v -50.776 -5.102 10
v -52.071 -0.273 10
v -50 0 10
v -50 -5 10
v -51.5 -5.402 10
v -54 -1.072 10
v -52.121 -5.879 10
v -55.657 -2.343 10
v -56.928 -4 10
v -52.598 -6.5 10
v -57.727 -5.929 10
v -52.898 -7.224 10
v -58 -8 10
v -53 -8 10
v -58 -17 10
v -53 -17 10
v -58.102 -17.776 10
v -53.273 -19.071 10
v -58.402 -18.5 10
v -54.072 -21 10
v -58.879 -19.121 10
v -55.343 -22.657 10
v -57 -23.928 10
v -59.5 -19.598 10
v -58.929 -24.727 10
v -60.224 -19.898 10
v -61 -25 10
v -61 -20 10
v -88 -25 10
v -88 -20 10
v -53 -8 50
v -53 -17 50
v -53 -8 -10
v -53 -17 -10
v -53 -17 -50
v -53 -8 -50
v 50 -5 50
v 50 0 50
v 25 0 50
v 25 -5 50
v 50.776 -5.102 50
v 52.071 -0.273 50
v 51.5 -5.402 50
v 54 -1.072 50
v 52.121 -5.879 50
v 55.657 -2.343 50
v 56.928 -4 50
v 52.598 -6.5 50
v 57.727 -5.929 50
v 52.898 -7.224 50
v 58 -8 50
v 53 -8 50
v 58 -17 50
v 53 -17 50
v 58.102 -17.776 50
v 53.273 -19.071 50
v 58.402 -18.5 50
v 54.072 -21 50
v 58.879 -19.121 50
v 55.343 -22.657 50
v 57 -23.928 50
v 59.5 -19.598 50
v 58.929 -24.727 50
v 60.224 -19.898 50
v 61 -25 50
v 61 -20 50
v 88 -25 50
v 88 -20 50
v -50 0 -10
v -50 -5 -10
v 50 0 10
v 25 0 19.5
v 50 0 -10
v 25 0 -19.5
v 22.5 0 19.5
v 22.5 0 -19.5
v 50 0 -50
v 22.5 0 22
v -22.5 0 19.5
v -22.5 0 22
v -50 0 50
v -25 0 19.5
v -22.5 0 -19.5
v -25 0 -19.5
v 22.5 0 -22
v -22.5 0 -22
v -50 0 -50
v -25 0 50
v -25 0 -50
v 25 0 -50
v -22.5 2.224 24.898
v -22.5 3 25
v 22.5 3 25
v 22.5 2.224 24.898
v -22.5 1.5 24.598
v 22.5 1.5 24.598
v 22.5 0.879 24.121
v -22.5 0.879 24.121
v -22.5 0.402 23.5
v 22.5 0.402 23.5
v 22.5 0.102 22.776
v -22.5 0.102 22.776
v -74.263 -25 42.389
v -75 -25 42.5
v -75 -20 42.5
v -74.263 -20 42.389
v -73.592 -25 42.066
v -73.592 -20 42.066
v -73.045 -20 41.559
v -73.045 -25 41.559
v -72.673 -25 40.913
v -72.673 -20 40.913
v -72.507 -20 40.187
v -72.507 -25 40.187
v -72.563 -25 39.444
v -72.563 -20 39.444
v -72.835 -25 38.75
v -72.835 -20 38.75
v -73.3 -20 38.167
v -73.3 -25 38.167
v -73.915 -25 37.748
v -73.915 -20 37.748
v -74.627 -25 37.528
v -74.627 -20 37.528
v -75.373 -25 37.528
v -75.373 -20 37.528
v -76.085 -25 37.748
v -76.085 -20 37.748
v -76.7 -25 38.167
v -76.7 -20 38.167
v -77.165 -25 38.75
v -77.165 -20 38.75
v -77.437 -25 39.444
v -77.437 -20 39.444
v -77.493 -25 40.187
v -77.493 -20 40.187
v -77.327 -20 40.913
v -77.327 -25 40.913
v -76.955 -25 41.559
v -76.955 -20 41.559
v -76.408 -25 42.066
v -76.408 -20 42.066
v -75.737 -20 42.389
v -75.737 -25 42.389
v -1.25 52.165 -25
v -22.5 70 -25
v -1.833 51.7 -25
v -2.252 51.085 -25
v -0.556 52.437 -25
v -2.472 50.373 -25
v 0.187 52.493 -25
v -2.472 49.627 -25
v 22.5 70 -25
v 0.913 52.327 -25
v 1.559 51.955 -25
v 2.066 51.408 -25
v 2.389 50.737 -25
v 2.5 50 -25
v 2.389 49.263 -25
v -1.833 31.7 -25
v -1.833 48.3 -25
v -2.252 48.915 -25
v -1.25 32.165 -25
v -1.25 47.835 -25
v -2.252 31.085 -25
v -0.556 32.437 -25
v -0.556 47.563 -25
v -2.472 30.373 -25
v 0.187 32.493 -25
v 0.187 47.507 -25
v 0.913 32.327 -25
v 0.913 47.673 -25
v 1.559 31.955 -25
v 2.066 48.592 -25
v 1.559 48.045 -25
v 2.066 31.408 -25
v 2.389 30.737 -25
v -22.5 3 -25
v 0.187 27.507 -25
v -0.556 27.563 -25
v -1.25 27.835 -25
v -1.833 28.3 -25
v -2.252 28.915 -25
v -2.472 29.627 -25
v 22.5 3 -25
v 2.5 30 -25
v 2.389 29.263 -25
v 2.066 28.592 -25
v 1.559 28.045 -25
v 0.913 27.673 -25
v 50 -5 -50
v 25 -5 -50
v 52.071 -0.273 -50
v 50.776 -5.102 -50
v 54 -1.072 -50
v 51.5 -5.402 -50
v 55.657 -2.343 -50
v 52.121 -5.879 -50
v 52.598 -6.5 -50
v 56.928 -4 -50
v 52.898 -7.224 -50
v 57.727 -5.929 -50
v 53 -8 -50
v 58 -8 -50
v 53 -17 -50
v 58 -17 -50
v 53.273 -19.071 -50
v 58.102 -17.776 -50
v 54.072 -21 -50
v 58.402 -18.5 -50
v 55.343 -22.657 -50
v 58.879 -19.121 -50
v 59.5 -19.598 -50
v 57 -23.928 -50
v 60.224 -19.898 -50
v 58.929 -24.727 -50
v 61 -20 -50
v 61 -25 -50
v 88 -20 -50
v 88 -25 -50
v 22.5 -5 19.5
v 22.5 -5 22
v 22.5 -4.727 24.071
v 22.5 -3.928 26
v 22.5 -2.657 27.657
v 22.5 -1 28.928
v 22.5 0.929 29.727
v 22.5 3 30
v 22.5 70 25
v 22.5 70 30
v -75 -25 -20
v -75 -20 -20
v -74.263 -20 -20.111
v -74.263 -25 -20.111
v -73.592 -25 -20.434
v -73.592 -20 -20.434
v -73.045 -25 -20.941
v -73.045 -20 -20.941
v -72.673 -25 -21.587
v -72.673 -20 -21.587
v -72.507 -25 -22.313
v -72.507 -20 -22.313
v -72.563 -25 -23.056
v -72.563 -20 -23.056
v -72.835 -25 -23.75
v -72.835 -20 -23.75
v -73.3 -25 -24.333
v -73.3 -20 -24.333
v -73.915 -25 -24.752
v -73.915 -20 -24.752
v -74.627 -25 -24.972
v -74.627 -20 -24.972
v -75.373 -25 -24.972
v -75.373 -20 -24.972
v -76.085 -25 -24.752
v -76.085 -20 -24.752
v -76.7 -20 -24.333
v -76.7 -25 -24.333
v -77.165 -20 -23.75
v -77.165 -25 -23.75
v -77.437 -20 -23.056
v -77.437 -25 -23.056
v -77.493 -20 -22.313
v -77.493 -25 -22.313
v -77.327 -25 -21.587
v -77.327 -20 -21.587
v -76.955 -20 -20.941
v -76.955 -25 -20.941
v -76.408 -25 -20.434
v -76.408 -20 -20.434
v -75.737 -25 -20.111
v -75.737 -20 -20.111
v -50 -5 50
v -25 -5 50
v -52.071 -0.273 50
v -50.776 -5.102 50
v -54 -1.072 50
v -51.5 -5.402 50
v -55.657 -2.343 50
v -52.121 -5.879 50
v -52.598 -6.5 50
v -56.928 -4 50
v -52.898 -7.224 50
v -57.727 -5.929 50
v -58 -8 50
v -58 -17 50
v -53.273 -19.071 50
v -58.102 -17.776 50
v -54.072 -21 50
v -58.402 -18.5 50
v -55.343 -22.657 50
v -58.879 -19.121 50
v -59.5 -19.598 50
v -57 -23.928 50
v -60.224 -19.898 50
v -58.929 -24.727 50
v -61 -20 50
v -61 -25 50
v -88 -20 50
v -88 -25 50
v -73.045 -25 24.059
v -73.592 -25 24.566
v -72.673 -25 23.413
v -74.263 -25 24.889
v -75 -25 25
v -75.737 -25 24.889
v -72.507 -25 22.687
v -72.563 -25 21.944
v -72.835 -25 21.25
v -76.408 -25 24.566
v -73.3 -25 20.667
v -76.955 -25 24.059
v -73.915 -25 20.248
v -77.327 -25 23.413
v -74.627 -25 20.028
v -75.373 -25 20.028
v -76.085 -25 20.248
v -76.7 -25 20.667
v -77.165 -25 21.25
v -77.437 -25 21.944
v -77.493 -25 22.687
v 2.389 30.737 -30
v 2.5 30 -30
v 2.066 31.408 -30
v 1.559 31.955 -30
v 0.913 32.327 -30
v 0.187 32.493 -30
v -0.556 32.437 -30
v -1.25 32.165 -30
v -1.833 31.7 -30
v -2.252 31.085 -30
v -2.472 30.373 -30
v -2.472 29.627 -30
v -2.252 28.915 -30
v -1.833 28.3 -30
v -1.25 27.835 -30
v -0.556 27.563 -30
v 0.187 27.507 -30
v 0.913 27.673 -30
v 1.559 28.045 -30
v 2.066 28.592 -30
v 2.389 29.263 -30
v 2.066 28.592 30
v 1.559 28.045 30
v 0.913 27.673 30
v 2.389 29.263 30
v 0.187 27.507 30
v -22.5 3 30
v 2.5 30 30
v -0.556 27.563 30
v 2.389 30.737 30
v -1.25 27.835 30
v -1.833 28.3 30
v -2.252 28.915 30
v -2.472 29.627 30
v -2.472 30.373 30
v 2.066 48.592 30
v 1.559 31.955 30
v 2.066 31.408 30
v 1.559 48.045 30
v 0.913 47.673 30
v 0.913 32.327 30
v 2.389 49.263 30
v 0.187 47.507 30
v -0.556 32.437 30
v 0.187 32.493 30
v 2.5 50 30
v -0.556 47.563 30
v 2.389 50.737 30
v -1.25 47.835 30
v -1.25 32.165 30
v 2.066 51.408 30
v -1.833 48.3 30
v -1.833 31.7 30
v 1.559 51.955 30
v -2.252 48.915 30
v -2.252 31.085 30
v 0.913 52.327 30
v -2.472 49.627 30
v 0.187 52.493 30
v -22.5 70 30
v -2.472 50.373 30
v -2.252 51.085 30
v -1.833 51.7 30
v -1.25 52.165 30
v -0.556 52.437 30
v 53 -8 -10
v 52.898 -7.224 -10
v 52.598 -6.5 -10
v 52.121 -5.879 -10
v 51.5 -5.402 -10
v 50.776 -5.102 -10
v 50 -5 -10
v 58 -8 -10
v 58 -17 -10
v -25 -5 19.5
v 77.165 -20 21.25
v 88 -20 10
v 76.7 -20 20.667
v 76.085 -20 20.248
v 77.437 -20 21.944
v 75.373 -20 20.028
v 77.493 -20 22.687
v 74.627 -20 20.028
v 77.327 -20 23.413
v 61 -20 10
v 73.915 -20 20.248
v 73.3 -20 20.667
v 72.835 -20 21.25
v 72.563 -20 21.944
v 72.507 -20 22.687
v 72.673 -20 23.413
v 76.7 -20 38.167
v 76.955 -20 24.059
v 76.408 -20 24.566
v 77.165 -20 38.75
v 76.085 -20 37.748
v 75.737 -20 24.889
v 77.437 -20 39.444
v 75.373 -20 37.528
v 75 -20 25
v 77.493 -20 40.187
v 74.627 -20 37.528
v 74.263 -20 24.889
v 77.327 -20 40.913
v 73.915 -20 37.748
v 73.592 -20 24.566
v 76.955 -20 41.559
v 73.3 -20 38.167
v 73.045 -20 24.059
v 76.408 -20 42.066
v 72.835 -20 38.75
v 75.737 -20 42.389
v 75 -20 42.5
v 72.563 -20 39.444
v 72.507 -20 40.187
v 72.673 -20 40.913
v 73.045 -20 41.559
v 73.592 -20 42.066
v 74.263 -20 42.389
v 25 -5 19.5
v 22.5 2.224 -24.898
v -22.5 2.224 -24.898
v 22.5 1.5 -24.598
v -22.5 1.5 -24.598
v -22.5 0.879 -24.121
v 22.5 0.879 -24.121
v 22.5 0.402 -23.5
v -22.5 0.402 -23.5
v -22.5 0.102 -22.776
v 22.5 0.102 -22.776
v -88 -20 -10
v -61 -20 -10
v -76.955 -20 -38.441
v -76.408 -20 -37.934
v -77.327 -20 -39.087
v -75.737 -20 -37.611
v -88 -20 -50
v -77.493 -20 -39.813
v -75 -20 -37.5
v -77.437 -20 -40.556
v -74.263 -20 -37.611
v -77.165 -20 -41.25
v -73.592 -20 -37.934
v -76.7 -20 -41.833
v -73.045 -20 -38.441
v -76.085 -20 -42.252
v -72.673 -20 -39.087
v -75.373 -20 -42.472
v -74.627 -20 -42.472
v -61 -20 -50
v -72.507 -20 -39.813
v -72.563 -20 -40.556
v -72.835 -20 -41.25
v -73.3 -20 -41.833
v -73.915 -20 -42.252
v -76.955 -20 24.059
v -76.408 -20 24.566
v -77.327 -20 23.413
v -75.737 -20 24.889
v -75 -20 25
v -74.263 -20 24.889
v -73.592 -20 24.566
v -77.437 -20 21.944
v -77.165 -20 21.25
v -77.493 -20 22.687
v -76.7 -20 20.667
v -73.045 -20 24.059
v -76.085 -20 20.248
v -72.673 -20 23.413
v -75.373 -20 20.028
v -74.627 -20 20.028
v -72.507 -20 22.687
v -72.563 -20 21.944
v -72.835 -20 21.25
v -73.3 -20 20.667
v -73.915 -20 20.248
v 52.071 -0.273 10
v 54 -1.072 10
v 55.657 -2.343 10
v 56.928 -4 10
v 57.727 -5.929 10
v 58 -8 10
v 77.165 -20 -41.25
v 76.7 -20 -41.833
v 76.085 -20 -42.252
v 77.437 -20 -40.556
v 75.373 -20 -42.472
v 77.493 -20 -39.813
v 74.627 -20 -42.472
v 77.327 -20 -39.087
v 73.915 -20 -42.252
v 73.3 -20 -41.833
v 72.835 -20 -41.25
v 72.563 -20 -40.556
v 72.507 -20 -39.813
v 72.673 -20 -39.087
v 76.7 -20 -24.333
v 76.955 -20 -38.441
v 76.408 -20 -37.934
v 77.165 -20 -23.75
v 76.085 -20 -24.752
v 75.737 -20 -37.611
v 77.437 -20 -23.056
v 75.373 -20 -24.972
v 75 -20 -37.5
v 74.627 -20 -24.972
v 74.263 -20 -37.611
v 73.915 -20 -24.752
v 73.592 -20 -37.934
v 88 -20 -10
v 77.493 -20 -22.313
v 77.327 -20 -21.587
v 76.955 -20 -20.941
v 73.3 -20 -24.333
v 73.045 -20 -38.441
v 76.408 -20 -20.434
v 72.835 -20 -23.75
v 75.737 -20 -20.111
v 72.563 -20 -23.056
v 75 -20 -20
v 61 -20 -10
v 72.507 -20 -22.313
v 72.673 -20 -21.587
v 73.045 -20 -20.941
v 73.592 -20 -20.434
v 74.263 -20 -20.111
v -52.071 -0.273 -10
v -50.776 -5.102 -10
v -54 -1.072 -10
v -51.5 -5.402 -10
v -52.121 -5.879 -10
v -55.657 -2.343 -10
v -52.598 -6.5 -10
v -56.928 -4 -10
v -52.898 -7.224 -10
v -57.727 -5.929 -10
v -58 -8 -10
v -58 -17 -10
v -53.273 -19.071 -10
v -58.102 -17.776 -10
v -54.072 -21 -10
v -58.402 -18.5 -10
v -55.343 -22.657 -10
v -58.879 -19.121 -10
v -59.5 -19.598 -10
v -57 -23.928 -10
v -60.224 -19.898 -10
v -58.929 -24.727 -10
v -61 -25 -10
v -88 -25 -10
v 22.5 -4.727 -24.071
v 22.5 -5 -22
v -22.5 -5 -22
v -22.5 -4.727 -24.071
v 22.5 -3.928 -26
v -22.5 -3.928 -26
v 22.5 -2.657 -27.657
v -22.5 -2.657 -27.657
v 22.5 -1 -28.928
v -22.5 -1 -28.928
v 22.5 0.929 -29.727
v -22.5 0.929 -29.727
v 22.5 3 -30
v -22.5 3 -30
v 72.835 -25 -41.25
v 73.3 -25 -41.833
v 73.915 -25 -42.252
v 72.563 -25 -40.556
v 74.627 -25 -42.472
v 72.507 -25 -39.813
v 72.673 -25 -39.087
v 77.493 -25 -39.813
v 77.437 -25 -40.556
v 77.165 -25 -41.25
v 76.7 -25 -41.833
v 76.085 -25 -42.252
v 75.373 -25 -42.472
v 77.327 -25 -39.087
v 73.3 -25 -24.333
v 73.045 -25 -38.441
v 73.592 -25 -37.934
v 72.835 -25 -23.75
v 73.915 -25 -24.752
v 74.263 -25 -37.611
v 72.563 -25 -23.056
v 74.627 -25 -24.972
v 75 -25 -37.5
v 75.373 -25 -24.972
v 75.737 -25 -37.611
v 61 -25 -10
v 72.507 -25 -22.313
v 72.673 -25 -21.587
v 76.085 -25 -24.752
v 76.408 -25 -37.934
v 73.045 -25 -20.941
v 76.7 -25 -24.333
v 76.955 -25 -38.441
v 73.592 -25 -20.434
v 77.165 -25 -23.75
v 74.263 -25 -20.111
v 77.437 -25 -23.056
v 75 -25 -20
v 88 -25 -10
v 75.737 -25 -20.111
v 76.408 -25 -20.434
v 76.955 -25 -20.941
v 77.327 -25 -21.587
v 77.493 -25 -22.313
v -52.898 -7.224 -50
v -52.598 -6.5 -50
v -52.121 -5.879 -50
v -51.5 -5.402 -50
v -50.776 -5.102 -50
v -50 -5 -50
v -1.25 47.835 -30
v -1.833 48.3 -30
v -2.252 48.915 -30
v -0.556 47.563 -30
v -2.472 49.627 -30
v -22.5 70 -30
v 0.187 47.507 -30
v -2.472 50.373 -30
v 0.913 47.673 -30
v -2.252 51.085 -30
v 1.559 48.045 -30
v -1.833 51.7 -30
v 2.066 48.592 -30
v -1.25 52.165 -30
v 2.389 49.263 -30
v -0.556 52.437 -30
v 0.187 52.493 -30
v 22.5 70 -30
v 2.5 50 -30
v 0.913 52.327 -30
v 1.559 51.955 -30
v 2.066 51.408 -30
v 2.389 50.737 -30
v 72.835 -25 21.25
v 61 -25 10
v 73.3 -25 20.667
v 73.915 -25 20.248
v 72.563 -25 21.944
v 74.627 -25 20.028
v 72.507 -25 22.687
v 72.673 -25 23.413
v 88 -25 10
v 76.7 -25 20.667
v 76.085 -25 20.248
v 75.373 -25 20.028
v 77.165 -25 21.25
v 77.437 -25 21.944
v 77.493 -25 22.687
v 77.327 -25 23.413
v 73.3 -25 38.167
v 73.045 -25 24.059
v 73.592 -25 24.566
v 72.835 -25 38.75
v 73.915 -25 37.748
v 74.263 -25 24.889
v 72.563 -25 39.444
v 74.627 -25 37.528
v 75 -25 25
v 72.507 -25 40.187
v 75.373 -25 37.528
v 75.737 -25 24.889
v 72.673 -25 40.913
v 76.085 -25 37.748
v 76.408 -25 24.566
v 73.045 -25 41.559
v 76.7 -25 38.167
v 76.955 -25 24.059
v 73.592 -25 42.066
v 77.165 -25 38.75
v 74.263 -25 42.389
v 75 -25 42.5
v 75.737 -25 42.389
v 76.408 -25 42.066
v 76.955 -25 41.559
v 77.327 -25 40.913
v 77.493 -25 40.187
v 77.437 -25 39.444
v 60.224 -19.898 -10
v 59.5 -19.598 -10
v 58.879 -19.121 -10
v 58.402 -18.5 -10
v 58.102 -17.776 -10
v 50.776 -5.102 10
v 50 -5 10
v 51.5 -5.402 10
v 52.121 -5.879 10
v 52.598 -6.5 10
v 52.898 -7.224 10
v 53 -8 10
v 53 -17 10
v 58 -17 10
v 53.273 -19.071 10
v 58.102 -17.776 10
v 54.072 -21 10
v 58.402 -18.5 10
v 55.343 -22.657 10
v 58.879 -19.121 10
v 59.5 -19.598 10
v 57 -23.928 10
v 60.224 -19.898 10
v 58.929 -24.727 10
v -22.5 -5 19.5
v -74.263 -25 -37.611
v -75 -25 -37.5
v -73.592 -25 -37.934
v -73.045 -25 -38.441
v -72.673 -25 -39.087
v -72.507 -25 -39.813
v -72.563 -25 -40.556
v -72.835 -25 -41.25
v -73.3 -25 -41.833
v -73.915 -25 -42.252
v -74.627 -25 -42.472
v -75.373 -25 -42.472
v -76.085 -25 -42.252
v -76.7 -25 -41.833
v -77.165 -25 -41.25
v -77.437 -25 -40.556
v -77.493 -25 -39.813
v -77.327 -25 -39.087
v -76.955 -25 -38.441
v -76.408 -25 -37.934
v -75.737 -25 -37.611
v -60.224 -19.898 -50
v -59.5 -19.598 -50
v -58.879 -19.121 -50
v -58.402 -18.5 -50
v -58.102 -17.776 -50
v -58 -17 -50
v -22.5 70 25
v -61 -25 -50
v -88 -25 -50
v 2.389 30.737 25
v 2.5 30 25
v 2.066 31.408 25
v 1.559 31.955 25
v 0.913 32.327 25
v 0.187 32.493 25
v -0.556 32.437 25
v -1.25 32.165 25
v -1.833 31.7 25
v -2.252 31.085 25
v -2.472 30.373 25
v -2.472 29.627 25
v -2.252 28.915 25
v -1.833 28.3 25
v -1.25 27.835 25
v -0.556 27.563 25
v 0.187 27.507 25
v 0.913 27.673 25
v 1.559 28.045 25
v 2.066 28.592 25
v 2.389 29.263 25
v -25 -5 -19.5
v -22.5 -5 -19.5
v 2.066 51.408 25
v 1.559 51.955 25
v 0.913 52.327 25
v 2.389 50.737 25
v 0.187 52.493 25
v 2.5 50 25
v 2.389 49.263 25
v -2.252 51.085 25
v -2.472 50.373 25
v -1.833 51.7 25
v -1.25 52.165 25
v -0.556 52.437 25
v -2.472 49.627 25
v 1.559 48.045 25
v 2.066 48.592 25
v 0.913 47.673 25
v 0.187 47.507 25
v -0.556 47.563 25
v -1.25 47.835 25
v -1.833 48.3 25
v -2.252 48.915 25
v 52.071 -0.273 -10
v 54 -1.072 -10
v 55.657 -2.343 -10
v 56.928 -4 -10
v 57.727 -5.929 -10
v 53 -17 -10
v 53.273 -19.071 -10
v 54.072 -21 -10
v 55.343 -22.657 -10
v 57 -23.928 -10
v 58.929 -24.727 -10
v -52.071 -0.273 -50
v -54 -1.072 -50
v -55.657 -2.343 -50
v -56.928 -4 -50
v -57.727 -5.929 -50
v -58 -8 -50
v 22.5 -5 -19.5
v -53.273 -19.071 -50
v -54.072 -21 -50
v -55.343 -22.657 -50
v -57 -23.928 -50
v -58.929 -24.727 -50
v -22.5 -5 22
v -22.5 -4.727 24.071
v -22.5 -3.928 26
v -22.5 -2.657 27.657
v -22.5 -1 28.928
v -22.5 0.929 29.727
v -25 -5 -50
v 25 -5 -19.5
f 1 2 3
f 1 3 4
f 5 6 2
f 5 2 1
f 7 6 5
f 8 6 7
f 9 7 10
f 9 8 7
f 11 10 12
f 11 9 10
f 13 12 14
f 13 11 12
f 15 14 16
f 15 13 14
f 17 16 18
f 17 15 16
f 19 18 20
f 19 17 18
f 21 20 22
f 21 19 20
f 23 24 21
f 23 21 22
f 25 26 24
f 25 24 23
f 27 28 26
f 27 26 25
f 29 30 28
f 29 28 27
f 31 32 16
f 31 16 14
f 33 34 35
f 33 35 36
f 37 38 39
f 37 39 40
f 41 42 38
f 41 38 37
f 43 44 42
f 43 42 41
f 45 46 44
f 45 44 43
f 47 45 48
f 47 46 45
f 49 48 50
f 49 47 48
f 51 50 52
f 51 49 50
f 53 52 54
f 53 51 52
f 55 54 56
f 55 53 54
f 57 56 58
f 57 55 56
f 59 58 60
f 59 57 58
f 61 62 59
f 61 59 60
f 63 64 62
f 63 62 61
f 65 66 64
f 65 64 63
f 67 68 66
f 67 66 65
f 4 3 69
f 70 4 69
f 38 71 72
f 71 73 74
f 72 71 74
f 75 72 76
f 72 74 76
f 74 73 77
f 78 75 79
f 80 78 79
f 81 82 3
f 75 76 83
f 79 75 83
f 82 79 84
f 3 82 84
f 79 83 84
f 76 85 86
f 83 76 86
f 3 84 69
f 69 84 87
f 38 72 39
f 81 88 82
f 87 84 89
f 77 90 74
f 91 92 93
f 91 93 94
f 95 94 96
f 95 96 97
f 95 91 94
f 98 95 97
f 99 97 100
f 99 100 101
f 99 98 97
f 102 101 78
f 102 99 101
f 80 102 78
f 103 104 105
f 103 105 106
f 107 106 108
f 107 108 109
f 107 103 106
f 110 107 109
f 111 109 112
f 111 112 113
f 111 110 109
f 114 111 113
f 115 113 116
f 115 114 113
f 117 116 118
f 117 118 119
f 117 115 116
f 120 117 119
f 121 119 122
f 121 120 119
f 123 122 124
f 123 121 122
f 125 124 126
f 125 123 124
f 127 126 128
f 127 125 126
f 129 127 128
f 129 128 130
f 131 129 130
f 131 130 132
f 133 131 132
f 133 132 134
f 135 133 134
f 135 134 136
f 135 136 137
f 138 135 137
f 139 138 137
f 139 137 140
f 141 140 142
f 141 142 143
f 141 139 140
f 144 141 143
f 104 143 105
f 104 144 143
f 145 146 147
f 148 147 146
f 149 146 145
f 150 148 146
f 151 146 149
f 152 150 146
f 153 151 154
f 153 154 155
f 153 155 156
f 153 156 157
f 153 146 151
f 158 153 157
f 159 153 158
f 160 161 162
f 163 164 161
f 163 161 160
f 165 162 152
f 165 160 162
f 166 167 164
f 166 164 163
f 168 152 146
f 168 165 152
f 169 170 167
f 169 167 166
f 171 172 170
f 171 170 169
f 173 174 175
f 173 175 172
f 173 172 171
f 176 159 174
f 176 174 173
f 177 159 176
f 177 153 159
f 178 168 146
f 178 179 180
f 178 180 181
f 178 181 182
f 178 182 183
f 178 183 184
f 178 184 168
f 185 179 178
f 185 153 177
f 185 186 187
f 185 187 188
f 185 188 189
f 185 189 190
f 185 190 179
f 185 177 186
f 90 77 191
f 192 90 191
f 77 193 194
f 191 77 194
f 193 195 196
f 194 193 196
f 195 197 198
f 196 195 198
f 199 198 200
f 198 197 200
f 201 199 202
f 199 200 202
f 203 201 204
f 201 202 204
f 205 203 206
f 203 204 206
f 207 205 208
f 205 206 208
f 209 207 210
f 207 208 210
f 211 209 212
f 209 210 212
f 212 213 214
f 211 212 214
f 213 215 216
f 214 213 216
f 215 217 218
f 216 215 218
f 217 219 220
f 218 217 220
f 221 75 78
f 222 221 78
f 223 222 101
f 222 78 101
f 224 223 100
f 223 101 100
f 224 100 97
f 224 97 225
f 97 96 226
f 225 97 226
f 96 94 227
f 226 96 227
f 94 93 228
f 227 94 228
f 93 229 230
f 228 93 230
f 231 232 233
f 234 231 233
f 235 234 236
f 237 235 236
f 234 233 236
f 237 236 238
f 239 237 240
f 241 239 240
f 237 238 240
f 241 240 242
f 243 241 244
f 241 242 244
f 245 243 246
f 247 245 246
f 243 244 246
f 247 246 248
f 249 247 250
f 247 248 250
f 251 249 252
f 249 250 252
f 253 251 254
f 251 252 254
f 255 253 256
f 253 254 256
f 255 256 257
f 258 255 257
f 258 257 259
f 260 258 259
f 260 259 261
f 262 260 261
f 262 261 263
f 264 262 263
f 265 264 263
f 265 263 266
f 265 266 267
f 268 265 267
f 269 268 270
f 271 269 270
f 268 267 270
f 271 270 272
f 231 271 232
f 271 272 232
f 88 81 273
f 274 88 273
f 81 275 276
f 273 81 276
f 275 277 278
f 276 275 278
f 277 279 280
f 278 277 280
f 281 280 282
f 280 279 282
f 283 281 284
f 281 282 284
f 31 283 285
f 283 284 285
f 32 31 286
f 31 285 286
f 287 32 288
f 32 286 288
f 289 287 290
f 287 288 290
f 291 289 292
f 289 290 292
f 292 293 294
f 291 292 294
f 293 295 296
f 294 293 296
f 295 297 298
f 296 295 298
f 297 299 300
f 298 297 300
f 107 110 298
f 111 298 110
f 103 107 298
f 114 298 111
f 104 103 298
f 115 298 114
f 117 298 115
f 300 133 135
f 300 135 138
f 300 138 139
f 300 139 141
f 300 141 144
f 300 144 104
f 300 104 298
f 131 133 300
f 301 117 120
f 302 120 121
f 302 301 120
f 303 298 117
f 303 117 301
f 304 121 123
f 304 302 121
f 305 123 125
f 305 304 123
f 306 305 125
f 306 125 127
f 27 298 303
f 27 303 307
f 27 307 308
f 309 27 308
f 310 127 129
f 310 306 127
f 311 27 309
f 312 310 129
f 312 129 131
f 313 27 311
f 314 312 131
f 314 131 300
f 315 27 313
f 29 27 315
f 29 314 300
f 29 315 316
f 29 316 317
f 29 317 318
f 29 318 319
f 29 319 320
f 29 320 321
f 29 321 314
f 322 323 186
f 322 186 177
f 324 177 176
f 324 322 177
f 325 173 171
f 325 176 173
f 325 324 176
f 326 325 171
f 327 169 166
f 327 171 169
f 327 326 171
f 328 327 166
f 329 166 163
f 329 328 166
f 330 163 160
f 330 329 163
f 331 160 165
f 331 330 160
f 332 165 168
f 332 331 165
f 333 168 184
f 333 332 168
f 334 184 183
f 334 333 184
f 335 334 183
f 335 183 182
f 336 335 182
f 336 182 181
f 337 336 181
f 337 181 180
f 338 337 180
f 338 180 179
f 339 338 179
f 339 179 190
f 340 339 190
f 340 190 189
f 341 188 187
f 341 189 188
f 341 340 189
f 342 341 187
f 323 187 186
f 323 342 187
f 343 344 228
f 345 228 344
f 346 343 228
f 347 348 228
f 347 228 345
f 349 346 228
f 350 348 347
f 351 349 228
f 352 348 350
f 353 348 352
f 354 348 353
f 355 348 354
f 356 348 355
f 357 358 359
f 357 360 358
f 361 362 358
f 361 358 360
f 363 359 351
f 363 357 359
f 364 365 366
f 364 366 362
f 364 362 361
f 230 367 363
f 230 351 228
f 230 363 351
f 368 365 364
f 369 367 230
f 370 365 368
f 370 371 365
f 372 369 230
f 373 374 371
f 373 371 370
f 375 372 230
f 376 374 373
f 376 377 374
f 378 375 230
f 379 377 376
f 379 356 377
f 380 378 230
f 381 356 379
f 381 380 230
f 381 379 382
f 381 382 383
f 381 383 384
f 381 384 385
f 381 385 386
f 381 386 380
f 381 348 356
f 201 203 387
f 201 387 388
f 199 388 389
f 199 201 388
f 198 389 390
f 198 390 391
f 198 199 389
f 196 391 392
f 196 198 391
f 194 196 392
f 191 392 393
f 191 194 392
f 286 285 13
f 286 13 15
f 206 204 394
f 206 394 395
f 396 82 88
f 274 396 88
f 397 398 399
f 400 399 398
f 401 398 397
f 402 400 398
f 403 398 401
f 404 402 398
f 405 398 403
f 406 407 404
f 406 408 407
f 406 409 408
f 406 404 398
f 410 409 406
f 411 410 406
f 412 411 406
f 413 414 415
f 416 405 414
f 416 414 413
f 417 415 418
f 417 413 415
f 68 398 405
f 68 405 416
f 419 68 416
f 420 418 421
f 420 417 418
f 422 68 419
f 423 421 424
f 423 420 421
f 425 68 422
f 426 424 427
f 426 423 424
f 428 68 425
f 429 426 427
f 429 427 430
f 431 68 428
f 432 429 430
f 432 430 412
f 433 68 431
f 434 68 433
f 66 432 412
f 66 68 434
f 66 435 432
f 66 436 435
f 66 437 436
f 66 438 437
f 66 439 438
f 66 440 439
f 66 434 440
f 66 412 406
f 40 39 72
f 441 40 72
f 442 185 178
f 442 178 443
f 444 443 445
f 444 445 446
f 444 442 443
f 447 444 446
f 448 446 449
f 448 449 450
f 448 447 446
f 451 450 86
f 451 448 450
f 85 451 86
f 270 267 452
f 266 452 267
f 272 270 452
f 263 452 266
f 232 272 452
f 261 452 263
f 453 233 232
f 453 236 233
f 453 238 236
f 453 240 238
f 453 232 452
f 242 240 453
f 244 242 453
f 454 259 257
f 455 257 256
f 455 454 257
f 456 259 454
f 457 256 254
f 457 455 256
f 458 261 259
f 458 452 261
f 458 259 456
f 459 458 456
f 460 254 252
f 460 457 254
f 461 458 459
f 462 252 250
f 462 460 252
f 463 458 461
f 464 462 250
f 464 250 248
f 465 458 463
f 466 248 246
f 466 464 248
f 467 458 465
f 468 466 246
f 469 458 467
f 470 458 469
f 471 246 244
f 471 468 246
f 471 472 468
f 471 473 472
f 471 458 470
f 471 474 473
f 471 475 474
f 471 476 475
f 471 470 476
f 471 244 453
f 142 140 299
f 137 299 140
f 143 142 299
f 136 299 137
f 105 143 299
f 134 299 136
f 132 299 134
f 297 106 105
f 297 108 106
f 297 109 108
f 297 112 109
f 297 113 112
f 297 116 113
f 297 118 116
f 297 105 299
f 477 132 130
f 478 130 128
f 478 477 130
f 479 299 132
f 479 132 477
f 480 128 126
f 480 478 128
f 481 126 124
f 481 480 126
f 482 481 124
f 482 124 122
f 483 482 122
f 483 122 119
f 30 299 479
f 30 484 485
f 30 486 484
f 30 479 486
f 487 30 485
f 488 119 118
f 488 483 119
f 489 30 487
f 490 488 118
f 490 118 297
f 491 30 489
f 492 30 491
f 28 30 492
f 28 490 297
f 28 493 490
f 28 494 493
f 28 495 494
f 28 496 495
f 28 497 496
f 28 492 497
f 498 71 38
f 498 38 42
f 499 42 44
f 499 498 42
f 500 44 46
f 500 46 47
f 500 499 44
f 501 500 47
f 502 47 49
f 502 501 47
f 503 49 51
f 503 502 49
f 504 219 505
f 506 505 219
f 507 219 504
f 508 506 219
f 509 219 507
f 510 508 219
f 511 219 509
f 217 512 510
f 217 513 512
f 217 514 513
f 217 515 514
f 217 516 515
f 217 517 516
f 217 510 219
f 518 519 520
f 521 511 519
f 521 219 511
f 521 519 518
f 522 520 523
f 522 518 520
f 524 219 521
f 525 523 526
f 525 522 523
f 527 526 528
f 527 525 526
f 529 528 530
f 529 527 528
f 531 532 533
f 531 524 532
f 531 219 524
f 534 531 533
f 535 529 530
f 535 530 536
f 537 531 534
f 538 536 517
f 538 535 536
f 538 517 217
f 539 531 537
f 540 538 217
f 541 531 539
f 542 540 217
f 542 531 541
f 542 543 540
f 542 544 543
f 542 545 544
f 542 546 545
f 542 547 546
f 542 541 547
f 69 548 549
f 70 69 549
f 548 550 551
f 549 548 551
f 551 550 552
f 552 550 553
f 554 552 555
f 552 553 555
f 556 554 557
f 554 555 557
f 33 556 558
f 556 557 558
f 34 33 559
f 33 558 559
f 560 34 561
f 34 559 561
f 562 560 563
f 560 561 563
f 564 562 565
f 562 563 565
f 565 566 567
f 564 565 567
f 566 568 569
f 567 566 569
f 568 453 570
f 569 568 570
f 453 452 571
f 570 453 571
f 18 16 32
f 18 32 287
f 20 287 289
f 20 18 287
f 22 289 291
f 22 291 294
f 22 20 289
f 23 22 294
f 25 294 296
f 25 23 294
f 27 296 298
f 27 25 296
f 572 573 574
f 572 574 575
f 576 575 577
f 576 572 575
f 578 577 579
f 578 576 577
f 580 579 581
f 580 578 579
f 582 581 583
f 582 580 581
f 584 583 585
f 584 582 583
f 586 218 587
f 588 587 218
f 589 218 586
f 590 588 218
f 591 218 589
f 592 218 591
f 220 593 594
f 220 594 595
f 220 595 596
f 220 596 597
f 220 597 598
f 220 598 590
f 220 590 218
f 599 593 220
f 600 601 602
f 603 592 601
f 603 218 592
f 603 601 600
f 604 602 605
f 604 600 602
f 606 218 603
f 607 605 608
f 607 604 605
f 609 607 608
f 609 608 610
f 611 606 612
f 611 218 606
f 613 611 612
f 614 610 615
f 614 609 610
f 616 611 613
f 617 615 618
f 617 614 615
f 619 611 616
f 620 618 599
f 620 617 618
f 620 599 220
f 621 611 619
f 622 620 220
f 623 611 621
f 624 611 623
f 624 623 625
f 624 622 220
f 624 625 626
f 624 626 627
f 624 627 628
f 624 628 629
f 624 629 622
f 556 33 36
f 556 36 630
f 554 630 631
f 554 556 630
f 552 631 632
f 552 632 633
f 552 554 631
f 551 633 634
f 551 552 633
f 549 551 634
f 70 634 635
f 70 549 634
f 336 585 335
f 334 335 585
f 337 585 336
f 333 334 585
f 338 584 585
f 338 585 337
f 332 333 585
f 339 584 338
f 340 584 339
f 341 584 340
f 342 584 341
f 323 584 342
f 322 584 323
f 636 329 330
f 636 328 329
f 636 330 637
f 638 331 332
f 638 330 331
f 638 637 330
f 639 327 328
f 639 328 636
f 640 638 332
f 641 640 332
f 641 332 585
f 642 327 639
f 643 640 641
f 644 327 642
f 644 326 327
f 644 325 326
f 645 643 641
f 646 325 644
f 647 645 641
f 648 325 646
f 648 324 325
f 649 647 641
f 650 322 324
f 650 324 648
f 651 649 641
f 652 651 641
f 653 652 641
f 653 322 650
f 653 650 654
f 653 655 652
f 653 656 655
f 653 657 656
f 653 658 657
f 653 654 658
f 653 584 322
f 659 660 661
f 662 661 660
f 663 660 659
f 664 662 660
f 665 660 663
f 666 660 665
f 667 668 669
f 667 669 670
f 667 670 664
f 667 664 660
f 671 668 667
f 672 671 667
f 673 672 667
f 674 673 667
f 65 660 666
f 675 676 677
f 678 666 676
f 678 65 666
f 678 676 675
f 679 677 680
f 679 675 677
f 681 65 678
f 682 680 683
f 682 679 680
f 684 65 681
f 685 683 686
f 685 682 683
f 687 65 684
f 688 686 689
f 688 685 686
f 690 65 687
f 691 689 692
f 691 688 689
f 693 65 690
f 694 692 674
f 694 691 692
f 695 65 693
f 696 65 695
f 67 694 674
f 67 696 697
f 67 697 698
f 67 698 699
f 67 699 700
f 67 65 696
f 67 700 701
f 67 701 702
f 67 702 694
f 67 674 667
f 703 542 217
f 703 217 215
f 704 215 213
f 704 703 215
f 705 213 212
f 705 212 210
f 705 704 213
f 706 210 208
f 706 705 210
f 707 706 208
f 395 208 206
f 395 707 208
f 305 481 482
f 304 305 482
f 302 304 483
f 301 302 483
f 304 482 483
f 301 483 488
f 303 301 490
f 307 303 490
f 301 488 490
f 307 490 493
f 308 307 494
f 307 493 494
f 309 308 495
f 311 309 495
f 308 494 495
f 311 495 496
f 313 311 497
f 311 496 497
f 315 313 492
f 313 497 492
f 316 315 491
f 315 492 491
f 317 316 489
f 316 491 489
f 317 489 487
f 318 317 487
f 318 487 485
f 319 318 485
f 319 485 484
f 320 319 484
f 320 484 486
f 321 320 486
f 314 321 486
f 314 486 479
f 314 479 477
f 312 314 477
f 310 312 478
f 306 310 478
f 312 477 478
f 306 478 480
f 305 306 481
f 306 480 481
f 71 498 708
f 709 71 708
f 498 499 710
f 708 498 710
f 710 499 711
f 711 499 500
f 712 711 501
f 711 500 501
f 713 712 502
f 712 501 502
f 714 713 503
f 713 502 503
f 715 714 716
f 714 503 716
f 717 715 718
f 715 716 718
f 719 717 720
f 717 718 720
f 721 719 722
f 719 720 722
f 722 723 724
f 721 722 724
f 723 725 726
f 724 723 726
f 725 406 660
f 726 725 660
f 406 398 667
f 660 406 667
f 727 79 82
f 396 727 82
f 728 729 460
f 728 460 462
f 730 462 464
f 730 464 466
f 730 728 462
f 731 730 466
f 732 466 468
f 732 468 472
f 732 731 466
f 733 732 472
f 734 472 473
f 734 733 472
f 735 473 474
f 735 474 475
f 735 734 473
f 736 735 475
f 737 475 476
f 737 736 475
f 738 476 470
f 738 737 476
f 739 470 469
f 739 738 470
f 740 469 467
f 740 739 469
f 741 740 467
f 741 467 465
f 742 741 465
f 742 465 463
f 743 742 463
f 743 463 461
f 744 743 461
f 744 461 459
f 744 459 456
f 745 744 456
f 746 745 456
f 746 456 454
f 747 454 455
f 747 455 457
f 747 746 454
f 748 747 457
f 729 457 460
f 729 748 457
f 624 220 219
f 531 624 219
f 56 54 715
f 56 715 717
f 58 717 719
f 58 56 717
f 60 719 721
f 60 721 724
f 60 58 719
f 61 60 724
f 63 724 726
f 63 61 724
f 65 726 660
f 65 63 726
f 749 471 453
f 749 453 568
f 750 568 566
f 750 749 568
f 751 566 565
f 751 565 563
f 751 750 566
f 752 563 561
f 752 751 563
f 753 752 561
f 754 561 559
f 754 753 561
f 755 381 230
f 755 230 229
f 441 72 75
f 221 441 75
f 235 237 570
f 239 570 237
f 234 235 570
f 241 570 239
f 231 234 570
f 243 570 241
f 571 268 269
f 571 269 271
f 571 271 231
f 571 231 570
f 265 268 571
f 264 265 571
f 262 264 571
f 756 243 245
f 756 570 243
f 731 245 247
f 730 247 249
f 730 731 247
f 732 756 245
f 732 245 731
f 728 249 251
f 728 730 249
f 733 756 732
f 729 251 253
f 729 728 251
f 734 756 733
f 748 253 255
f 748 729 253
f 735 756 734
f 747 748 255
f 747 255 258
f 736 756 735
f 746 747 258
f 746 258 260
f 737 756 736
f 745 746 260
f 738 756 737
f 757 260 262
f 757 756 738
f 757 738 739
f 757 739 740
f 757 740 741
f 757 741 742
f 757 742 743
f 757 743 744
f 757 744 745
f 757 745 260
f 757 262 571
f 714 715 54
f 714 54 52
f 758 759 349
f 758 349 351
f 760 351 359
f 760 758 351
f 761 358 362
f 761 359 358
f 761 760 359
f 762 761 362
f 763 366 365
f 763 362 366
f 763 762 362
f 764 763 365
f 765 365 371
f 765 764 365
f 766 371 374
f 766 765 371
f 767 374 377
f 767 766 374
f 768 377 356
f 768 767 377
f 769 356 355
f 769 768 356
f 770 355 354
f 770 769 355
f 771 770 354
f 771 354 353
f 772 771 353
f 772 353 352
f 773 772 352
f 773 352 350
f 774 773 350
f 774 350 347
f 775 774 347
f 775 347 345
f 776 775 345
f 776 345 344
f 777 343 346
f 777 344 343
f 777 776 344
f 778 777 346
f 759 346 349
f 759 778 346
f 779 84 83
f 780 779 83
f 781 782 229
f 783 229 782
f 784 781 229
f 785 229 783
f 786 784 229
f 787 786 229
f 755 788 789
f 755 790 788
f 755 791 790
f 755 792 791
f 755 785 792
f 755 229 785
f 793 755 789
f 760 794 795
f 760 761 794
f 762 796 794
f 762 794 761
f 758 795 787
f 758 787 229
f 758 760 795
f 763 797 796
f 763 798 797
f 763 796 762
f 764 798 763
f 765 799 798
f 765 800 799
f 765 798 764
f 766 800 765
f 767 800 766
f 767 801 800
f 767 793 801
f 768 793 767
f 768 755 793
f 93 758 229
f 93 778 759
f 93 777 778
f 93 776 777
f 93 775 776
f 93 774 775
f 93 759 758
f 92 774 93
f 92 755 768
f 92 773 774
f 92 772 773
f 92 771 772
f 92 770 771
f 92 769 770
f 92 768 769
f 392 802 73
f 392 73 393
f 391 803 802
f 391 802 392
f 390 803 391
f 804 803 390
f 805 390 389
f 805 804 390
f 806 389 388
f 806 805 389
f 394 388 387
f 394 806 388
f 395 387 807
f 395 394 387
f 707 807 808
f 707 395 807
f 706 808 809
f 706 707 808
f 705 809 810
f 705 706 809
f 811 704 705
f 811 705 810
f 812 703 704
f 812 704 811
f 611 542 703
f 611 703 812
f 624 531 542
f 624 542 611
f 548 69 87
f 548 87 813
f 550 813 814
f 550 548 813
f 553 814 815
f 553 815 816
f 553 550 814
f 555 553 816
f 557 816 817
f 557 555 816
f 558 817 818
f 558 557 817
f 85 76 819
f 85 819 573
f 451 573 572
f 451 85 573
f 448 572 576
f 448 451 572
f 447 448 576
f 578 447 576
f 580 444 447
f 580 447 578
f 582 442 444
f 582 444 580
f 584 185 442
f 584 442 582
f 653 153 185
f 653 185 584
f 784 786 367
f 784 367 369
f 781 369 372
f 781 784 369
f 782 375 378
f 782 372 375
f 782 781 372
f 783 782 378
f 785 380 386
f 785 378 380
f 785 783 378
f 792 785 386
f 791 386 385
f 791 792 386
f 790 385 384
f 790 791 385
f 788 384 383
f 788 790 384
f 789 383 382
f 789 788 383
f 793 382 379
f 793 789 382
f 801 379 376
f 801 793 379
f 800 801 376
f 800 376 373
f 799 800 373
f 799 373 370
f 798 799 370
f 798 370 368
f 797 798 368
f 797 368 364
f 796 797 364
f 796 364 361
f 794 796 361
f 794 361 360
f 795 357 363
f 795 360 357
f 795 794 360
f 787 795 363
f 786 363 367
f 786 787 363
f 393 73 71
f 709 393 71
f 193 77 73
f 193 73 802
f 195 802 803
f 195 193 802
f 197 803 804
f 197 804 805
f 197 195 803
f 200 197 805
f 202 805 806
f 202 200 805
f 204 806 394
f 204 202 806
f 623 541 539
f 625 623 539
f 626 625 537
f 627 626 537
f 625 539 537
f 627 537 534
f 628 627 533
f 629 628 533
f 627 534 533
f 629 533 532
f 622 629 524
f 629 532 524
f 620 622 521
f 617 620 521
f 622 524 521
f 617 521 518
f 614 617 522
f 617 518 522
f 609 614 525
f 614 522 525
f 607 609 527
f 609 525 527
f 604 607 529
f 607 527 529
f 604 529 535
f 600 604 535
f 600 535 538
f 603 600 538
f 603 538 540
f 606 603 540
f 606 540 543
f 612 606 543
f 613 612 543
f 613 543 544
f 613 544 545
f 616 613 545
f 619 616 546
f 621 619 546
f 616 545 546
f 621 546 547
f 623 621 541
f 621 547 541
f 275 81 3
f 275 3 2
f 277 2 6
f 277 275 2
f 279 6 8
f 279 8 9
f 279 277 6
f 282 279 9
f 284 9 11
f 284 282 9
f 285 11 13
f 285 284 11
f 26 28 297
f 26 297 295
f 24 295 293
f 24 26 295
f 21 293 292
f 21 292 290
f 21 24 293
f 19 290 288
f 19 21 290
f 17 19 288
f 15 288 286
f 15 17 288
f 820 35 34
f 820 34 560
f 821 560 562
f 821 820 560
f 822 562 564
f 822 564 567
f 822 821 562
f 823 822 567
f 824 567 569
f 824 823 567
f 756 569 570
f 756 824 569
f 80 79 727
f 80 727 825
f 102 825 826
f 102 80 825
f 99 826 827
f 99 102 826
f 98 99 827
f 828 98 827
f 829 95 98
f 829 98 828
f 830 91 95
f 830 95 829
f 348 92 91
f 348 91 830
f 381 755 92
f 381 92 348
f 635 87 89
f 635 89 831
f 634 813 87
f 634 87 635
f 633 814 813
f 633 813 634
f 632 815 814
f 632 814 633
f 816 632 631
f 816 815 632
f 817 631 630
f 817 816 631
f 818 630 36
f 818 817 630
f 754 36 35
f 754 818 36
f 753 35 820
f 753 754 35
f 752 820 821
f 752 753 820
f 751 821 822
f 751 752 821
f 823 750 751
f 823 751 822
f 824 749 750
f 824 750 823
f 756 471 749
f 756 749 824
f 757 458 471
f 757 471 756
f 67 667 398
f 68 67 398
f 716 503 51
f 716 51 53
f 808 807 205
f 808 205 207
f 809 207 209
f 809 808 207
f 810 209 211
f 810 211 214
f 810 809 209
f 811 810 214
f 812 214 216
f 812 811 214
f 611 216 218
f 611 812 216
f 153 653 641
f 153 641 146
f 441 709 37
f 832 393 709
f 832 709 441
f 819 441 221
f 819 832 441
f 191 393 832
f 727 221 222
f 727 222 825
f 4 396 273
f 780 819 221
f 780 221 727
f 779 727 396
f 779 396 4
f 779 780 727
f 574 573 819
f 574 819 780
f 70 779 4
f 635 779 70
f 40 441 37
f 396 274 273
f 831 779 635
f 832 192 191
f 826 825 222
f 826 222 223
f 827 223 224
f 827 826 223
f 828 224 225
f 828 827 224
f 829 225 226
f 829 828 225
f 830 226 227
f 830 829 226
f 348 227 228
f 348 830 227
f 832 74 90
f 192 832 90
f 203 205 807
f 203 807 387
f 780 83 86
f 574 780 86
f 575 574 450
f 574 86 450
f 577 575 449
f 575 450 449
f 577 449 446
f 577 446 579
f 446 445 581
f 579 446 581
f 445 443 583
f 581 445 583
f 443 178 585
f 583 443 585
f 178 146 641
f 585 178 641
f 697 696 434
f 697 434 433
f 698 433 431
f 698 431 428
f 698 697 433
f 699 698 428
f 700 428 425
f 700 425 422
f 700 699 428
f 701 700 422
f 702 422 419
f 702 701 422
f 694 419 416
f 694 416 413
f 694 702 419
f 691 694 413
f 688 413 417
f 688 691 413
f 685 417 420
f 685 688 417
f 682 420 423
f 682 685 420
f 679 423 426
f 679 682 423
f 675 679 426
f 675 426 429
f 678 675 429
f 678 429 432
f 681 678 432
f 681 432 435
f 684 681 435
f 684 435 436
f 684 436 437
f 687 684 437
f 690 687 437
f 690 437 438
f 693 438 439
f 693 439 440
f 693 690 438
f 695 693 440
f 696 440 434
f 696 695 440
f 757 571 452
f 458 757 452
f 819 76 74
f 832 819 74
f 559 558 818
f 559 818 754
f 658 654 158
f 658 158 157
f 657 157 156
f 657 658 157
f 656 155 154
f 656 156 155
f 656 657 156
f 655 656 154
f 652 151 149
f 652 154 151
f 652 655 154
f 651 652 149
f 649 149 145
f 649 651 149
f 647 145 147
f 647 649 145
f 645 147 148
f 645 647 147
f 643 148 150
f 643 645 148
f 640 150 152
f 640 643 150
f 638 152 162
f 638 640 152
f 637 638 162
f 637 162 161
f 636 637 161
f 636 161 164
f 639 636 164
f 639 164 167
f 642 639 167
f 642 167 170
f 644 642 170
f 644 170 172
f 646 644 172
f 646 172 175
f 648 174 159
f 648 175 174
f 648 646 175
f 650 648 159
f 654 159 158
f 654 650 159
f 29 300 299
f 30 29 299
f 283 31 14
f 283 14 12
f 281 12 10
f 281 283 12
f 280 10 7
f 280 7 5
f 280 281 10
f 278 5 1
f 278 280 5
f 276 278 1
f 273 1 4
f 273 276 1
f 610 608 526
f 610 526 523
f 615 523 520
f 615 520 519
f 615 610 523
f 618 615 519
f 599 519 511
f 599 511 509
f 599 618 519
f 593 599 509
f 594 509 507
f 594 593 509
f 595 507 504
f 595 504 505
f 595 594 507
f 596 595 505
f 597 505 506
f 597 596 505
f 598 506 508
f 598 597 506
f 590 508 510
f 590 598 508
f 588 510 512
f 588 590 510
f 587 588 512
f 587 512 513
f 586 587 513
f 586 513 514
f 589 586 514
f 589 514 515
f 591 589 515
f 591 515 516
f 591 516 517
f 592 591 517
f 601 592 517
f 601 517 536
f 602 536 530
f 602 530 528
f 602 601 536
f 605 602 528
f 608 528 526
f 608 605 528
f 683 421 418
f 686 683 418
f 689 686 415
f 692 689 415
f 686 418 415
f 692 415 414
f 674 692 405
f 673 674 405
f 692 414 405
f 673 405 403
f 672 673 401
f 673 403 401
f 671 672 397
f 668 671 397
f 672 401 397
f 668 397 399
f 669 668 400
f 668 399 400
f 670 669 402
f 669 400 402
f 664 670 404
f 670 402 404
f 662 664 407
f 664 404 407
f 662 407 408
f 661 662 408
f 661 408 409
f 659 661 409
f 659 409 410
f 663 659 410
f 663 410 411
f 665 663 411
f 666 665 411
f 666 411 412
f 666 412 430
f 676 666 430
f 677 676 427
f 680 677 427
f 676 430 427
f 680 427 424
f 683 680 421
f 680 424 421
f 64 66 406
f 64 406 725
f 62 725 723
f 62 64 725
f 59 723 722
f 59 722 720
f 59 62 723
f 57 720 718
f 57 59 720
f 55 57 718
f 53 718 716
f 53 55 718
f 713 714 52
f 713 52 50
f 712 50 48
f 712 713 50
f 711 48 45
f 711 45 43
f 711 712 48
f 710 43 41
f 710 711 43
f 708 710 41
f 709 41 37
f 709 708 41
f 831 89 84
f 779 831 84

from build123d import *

# Parameters (mm, degrees)
SM_BASE_FLANGE_1_DEPTH            = 5
SM_EDGE_FLANGE_1_STRIP_W          = 26
SM_EDGE_FLANGE_1_STRIP_H          = 5
SM_EDGE_FLANGE_1_STRIP_CUT_DEPTH  = 45
SM_EDGE_FLANGE_1_RELIEF_W         = 28.5
SM_EDGE_FLANGE_1_RELIEF_H         = 2.5
SM_EDGE_FLANGE_1_RELIEF_CUT_DEPTH = 5
SM_EDGE_FLANGE_1_DEPTH            = 45
SM_EDGE_FLANGE_2_STRIP_W          = 26
SM_EDGE_FLANGE_2_STRIP_H          = 5
SM_EDGE_FLANGE_2_STRIP_CUT_DEPTH  = 45
SM_EDGE_FLANGE_2_RELIEF_W         = 28.5
SM_EDGE_FLANGE_2_RELIEF_H         = 2.5
SM_EDGE_FLANGE_2_RELIEF_CUT_DEPTH = 5
SM_EDGE_FLANGE_2_DEPTH            = 45
SM_EDGE_FLANGE_14_DEPTH           = 40
SM_EDGE_FLANGE_15_DEPTH           = 40
SM_EDGE_FLANGE_16_DEPTH           = 40
SM_EDGE_FLANGE_17_DEPTH           = 40
SM_EDGE_FLANGE_18_STRIP_W         = 26
SM_EDGE_FLANGE_18_STRIP_H         = 5
SM_EDGE_FLANGE_18_STRIP_CUT_DEPTH = 40
SM_EDGE_FLANGE_18_DEPTH           = 40
SM_EDGE_FLANGE_19_STRIP_W         = 26
SM_EDGE_FLANGE_19_STRIP_H         = 5
SM_EDGE_FLANGE_19_STRIP_CUT_DEPTH = 40
SM_EDGE_FLANGE_19_DEPTH           = 40
SM_EDGE_FLANGE_20_STRIP_W         = 26
SM_EDGE_FLANGE_20_STRIP_H         = 5
SM_EDGE_FLANGE_20_STRIP_CUT_DEPTH = 40
SM_EDGE_FLANGE_20_DEPTH           = 40
SM_EDGE_FLANGE_21_STRIP_W         = 26
SM_EDGE_FLANGE_21_STRIP_H         = 5
SM_EDGE_FLANGE_21_STRIP_CUT_DEPTH = 40
SM_EDGE_FLANGE_21_DEPTH           = 40
CUT_EXTRUDE_START                 = -25
SKETCH_80_R                       = 2.5
CUT_EXTRUDE_1_DEPTH               = 5
CUT_EXTRUDE_3_DEPTH               = 124.060960503
CUT_EXTRUDE_3_DEPTH_BACK          = 124.060960503
SKETCH_83_R                       = 2.5
CUT_EXTRUDE_START_2               = -20
SKETCH_84_R                       = 2.5
CUT_EXTRUDE_5_DEPTH               = 5


# Sheet-metal steps are written as plain solids
with BuildPart() as part:
    # Sketch 1 → 基体-法兰1 (new body)
    with BuildSketch(Plane(origin=(0, 0, 0), x_dir=(1, 0, 0), z_dir=(0, 1, 0))):
        Polygon((-25, -25), (-25, -50), (-50, -50), (-50, 50), (-25, 50), (-25, 25), (25, 25), (25, 50), (50, 50), (50, -50), (25, -50), (25, -25), align=None)
    extrude(amount=-SM_BASE_FLANGE_1_DEPTH)

    # 边线-法兰1 strip (across the edge) → 边线-法兰1 strip cut (cut)
    with BuildSketch(Plane(origin=(22.5, 0, -25), x_dir=(0, 0, 1), z_dir=(-1, 0, 0))):
        with Locations((-10, -2.5)):
            Rectangle(SM_EDGE_FLANGE_1_STRIP_W, SM_EDGE_FLANGE_1_STRIP_H)
    extrude(amount=SM_EDGE_FLANGE_1_STRIP_CUT_DEPTH, mode=Mode.SUBTRACT)

    # 边线-法兰1 relief (on the sheet) → 边线-法兰1 relief cut (cut)
    with BuildSketch(Plane(origin=(22.5, 0, -22), x_dir=(0, 0, 1), z_dir=(0, 1, 0))):
        with Locations((-11.75, 1.25)):
            Rectangle(SM_EDGE_FLANGE_1_RELIEF_W, SM_EDGE_FLANGE_1_RELIEF_H)
        with Locations((-11.75, -46.25)):
            Rectangle(SM_EDGE_FLANGE_1_RELIEF_W, SM_EDGE_FLANGE_1_RELIEF_H)
    extrude(amount=-SM_EDGE_FLANGE_1_RELIEF_CUT_DEPTH, mode=Mode.SUBTRACT)

    # 边线-法兰1 section (across the edge) → 边线-法兰1 (add)
    with BuildSketch(Plane(origin=(22.5, 0, -25), x_dir=(0, 0, 1), z_dir=(-1, 0, 0))):
        with BuildLine():
            Line((-5, 3), (-5, 70))
            Line((-5, 70), (0, 70))
            Line((0, 70), (0, 3))
            ThreePointArc((0, 3), (0.878679656, 0.878679656), (3, 0))
            Line((3, 0), (3, -5))
            ThreePointArc((3, -5), (-2.656854249, -2.656854249), (-5, 3))
        make_face()
    extrude(amount=SM_EDGE_FLANGE_1_DEPTH)

    # 边线-法兰2 strip (across the edge) → 边线-法兰2 strip cut (cut)
    with BuildSketch(Plane(origin=(-22.5, 0, 25), x_dir=(0, 0, -1), z_dir=(1, 0, 0))):
        with Locations((-10, -2.5)):
            Rectangle(SM_EDGE_FLANGE_2_STRIP_W, SM_EDGE_FLANGE_2_STRIP_H)
    extrude(amount=SM_EDGE_FLANGE_2_STRIP_CUT_DEPTH, mode=Mode.SUBTRACT)

    # 边线-法兰2 relief (on the sheet) → 边线-法兰2 relief cut (cut)
    with BuildSketch(Plane(origin=(-22.5, 0, 22), x_dir=(0, 0, -1), z_dir=(0, 1, 0))):
        with Locations((-11.75, 1.25)):
            Rectangle(SM_EDGE_FLANGE_2_RELIEF_W, SM_EDGE_FLANGE_2_RELIEF_H)
        with Locations((-11.75, -46.25)):
            Rectangle(SM_EDGE_FLANGE_2_RELIEF_W, SM_EDGE_FLANGE_2_RELIEF_H)
    extrude(amount=-SM_EDGE_FLANGE_2_RELIEF_CUT_DEPTH, mode=Mode.SUBTRACT)

    # 边线-法兰2 section (across the edge) → 边线-法兰2 (add)
    with BuildSketch(Plane(origin=(-22.5, 0, 25), x_dir=(0, 0, -1), z_dir=(1, 0, 0))):
        with BuildLine():
            Line((-5, 3), (-5, 70))
            Line((-5, 70), (0, 70))
            Line((0, 70), (0, 3))
            ThreePointArc((0, 3), (0.878679656, 0.878679656), (3, 0))
            Line((3, 0), (3, -5))
            ThreePointArc((3, -5), (-2.656854249, -2.656854249), (-5, 3))
        make_face()
    extrude(amount=SM_EDGE_FLANGE_2_DEPTH)

    # 边线-法兰14 section (across the edge) → 边线-法兰14 (add)
    with BuildSketch(Plane(origin=(53, -5, 10), x_dir=(-1, 0, 0), z_dir=(0, 0, 1))):
        with BuildLine():
            Line((-5, 3), (-5, 20))
            Line((-5, 20), (0, 20))
            Line((0, 20), (0, 3))
            ThreePointArc((0, 3), (0.878679656, 0.878679656), (3, 0))
            Line((3, 0), (3, -5))
            ThreePointArc((3, -5), (-2.656854249, -2.656854249), (-5, 3))
        make_face()
    extrude(amount=SM_EDGE_FLANGE_14_DEPTH)

    # 边线-法兰15 section (across the edge) → 边线-法兰15 (add)
    with BuildSketch(Plane(origin=(53, -5, -50), x_dir=(-1, 0, 0), z_dir=(0, 0, 1))):
        with BuildLine():
            Line((-5, 3), (-5, 20))
            Line((-5, 20), (0, 20))
            Line((0, 20), (0, 3))
            ThreePointArc((0, 3), (0.878679656, 0.878679656), (3, 0))
            Line((3, 0), (3, -5))
            ThreePointArc((3, -5), (-2.656854249, -2.656854249), (-5, 3))
        make_face()
    extrude(amount=SM_EDGE_FLANGE_15_DEPTH)

    # 边线-法兰16 section (across the edge) → 边线-法兰16 (add)
    with BuildSketch(Plane(origin=(-53, -5, -10), x_dir=(1, 0, 0), z_dir=(0, 0, -1))):
        with BuildLine():
            Line((-5, 3), (-5, 20))
            Line((-5, 20), (0, 20))
            Line((0, 20), (0, 3))
            ThreePointArc((0, 3), (0.878679656, 0.878679656), (3, 0))
            Line((3, 0), (3, -5))
            ThreePointArc((3, -5), (-2.656854249, -2.656854249), (-5, 3))
        make_face()
    extrude(amount=SM_EDGE_FLANGE_16_DEPTH)

    # 边线-法兰17 section (across the edge) → 边线-法兰17 (add)
    with BuildSketch(Plane(origin=(-53, -5, 50), x_dir=(1, 0, 0), z_dir=(0, 0, -1))):
        with BuildLine():
            Line((-5, 3), (-5, 20))
            Line((-5, 20), (0, 20))
            Line((0, 20), (0, 3))
            ThreePointArc((0, 3), (0.878679656, 0.878679656), (3, 0))
            Line((3, 0), (3, -5))
            ThreePointArc((3, -5), (-2.656854249, -2.656854249), (-5, 3))
        make_face()
    extrude(amount=SM_EDGE_FLANGE_17_DEPTH)

    # 边线-法兰18 strip (across the edge) → 边线-法兰18 strip cut (cut)
    with BuildSketch(Plane(origin=(-58, -25, -50), x_dir=(0, 1, 0), z_dir=(0, 0, 1))):
        with Locations((-5, -2.5)):
            Rectangle(SM_EDGE_FLANGE_18_STRIP_W, SM_EDGE_FLANGE_18_STRIP_H)
    extrude(amount=SM_EDGE_FLANGE_18_STRIP_CUT_DEPTH, mode=Mode.SUBTRACT)

    # 边线-法兰18 section (across the edge) → 边线-法兰18 (add)
    with BuildSketch(Plane(origin=(-58, -25, -50), x_dir=(0, 1, 0), z_dir=(0, 0, 1))):
        with BuildLine():
            Line((0, 3), (0, 30))
            Line((0, 30), (5, 30))
            Line((5, 30), (5, 3))
            ThreePointArc((5, 3), (5.878679656, 0.878679656), (8, 0))
            Line((8, 0), (8, -5))
            ThreePointArc((8, -5), (2.343145751, -2.656854249), (0, 3))
        make_face()
    extrude(amount=SM_EDGE_FLANGE_18_DEPTH)

    # 边线-法兰19 strip (across the edge) → 边线-法兰19 strip cut (cut)
    with BuildSketch(Plane(origin=(-58, -25, 10), x_dir=(0, 1, 0), z_dir=(0, 0, 1))):
        with Locations((-5, -2.5)):
            Rectangle(SM_EDGE_FLANGE_19_STRIP_W, SM_EDGE_FLANGE_19_STRIP_H)
    extrude(amount=SM_EDGE_FLANGE_19_STRIP_CUT_DEPTH, mode=Mode.SUBTRACT)

    # 边线-法兰19 section (across the edge) → 边线-法兰19 (add)
    with BuildSketch(Plane(origin=(-58, -25, 10), x_dir=(0, 1, 0), z_dir=(0, 0, 1))):
        with BuildLine():
            Line((0, 3), (0, 30))
            Line((0, 30), (5, 30))
            Line((5, 30), (5, 3))
            ThreePointArc((5, 3), (5.878679656, 0.878679656), (8, 0))
            Line((8, 0), (8, -5))
            ThreePointArc((8, -5), (2.343145751, -2.656854249), (0, 3))
        make_face()
    extrude(amount=SM_EDGE_FLANGE_19_DEPTH)

    # 边线-法兰20 strip (across the edge) → 边线-法兰20 strip cut (cut)
    with BuildSketch(Plane(origin=(58, -25, 50), x_dir=(0, 1, 0), z_dir=(0, 0, -1))):
        with Locations((-5, -2.5)):
            Rectangle(SM_EDGE_FLANGE_20_STRIP_W, SM_EDGE_FLANGE_20_STRIP_H)
    extrude(amount=SM_EDGE_FLANGE_20_STRIP_CUT_DEPTH, mode=Mode.SUBTRACT)

    # 边线-法兰20 section (across the edge) → 边线-法兰20 (add)
    with BuildSketch(Plane(origin=(58, -25, 50), x_dir=(0, 1, 0), z_dir=(0, 0, -1))):
        with BuildLine():
            Line((0, 3), (0, 30))
            Line((0, 30), (5, 30))
            Line((5, 30), (5, 3))
            ThreePointArc((5, 3), (5.878679656, 0.878679656), (8, 0))
            Line((8, 0), (8, -5))
            ThreePointArc((8, -5), (2.343145751, -2.656854249), (0, 3))
        make_face()
    extrude(amount=SM_EDGE_FLANGE_20_DEPTH)

    # 边线-法兰21 strip (across the edge) → 边线-法兰21 strip cut (cut)
    with BuildSketch(Plane(origin=(58, -25, -10), x_dir=(0, 1, 0), z_dir=(0, 0, -1))):
        with Locations((-5, -2.5)):
            Rectangle(SM_EDGE_FLANGE_21_STRIP_W, SM_EDGE_FLANGE_21_STRIP_H)
    extrude(amount=SM_EDGE_FLANGE_21_STRIP_CUT_DEPTH, mode=Mode.SUBTRACT)

    # 边线-法兰21 section (across the edge) → 边线-法兰21 (add)
    with BuildSketch(Plane(origin=(58, -25, -10), x_dir=(0, 1, 0), z_dir=(0, 0, -1))):
        with BuildLine():
            Line((0, 3), (0, 30))
            Line((0, 30), (5, 30))
            Line((5, 30), (5, 3))
            ThreePointArc((5, 3), (5.878679656, 0.878679656), (8, 0))
            Line((8, 0), (8, -5))
            ThreePointArc((8, -5), (2.343145751, -2.656854249), (0, 3))
        make_face()
    extrude(amount=SM_EDGE_FLANGE_21_DEPTH)

    # 草图80 → 切除-拉伸1 (cut)
    with BuildSketch(Plane(origin=(0, 0, 0), x_dir=(1, 0, 0), z_dir=(0, 1, 0)).offset(CUT_EXTRUDE_START)):
        with Locations(Location((-75, 40, 0), (0, 0, 270))):
            Circle(SKETCH_80_R)
        with Locations(Location((75, 40, 0), (0, 0, 270))):
            Circle(SKETCH_80_R)
        with Locations(Location((-75, -40, 0), (0, 0, 270))):
            Circle(SKETCH_80_R)
        with Locations(Location((75, -40, 0), (0, 0, 270))):
            Circle(SKETCH_80_R)
    extrude(amount=CUT_EXTRUDE_1_DEPTH, mode=Mode.SUBTRACT)

    # 草图83 → 切除-拉伸3 (cut, two sides: drawn at the far end of the back side and taken through both)
    with BuildSketch(Plane.XY.offset(-CUT_EXTRUDE_3_DEPTH_BACK)):
        with Locations((0, 50)):
            Circle(SKETCH_83_R)
        with Locations((0, 30)):
            Circle(SKETCH_83_R)
    extrude(amount=CUT_EXTRUDE_3_DEPTH + CUT_EXTRUDE_3_DEPTH_BACK, mode=Mode.SUBTRACT)

    # 草图84 → 切除-拉伸5 (cut)
    with BuildSketch(Plane(origin=(0, 0, 0), x_dir=(1, 0, 0), z_dir=(0, 1, 0)).offset(CUT_EXTRUDE_START_2)):
        with Locations(Location((75, 22.5, 0), (0, 0, 270))):
            Circle(SKETCH_84_R)
        with Locations(Location((75, -22.5, 0), (0, 0, 270))):
            Circle(SKETCH_84_R)
        with Locations(Location((-75, -22.5, 0), (0, 0, 270))):
            Circle(SKETCH_84_R)
        with Locations(Location((-75, 22.5, 0), (0, 0, 270))):
            Circle(SKETCH_84_R)
    extrude(amount=-CUT_EXTRUDE_5_DEPTH, mode=Mode.SUBTRACT)


solid = part.part
